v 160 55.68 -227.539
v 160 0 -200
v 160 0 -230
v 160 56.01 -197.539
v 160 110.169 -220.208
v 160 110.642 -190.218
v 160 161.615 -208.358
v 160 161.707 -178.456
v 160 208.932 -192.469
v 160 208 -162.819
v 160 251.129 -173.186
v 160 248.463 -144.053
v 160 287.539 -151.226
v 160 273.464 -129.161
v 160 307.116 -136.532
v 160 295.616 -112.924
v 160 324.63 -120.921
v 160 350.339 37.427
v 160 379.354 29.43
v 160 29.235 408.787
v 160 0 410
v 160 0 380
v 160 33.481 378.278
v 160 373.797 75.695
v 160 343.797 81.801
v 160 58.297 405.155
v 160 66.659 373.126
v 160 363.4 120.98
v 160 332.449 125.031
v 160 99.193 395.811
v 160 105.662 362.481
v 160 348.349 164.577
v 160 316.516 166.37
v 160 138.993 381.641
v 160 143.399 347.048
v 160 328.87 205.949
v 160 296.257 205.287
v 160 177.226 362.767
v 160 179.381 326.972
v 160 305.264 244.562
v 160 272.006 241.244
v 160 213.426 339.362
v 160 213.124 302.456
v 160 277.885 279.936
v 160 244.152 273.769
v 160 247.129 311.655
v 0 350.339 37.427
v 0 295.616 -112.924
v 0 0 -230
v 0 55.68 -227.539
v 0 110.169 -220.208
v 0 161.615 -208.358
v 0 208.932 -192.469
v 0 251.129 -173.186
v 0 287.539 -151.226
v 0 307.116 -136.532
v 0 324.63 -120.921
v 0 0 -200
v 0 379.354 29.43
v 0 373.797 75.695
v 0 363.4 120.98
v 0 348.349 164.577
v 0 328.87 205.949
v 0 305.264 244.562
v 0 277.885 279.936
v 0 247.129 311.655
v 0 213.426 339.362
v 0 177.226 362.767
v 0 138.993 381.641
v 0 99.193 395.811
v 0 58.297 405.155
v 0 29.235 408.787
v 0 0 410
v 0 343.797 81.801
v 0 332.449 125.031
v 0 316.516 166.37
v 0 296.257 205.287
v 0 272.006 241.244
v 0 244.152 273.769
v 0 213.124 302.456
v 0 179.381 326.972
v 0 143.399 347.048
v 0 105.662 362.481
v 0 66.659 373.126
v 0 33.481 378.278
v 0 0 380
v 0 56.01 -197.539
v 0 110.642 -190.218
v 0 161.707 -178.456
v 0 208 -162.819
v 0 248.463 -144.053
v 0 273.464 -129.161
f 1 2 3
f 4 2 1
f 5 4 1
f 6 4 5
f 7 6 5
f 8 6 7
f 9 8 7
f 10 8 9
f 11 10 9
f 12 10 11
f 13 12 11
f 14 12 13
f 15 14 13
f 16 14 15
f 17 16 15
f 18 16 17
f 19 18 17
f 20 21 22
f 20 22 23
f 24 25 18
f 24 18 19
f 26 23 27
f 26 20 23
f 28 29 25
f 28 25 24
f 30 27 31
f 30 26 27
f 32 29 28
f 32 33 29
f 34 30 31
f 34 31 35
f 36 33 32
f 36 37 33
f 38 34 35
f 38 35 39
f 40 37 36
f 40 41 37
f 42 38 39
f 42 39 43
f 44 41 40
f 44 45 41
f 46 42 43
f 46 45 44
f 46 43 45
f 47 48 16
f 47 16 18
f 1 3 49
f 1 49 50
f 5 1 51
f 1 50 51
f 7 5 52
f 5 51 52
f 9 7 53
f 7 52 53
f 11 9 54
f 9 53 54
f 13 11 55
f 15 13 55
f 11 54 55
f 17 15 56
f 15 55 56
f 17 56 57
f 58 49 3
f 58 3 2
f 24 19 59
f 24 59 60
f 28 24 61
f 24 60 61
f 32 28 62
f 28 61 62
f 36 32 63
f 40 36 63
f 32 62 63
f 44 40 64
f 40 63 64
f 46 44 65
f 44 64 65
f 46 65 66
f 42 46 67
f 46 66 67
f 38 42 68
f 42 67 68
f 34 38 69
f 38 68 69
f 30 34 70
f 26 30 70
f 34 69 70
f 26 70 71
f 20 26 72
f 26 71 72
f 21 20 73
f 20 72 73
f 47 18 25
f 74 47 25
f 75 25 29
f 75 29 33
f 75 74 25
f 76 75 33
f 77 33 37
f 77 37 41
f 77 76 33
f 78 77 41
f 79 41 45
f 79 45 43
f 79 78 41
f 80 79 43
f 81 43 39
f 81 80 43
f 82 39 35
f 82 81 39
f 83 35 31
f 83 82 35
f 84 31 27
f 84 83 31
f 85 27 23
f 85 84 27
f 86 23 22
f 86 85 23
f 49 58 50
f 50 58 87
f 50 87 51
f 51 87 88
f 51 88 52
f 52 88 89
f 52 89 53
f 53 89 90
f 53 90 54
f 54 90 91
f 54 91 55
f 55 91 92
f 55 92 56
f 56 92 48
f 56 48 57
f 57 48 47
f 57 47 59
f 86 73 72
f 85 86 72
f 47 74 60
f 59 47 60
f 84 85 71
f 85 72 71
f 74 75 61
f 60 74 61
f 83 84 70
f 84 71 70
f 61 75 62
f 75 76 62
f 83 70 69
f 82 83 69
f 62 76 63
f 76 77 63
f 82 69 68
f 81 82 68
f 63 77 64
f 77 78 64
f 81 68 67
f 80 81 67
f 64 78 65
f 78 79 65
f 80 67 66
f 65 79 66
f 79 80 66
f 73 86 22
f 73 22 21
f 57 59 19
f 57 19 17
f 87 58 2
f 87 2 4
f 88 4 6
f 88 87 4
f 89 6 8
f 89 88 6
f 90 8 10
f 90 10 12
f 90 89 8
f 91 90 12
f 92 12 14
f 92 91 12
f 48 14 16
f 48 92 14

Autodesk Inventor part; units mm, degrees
ref_plane "YZ Plane" through (0, 0, 0) normal (1, 0, 0) x (0, 1, 0)
ref_plane "XY Plane" through (0, 0, 0) normal (0, 0, 1) x (1, 0, 0)
sketch "Sketch2" plane through (0, 0, 0) normal (1, 0, 0) x (0, 1, 0)
  line L0 (0, 380) -> (0, 410)
  line L1 (0, -230) -> (0, -200)
  line L2 (0, 0) -> (0, 132.8644)
  line L3 (295.6158, -112.924) -> (350.339, 37.4268)
  line L4 (379.3536, 29.4296) -> (324.6304, -120.9212)
  ellipse E0 centre (0, 0) end of major axis (358.1699, 0) minor radius 200 (0, -200) -> (295.6158, -112.924) ccw
  ellipse E1 centre (0, 0) end of major axis (352.0508, 0) minor radius 380 (350.339, 37.4268) -> (0, 380) ccw
  ellipse E2 centre (0, 0) end of major axis (381.6296, 0) minor radius 230 (0, -230) -> (324.6304, -120.9212) ccw
  ellipse E3 centre (0, 0) end of major axis (380.3347, 0) minor radius 410 (379.3536, 29.4296) -> (0, 410) ccw
  point P0 (0, 0)
  dimension "d10" = 30
  dimension "d11" = 30
  dimension "d12" = 0
  dimension "d16" = 380
  dimension "d17" = 200
  dimension "d25" = 20
  dimension "d26" = 160
  dimension "d27" = 30
  dimension "d28" = 160
extrude "Extrusion1" add sketch "Sketch2" along normal blind 160
sketch "Sketch3" plane through (0, 0, 0) normal (-1, 0, 0) x (0, 0, 1)
  line L0 (171.5389, -307.9404) -> (-54.4979, 313.0907)
  line L1 (-120.9212, 324.6304) -> (29.4296, 379.3536) projected
  line L2 (-111.428, -307.9404) -> (360.7046, -307.9404)
  line L3 (76.7879, 236.8347) -> (76.7879, -307.9404)
  point P0 (0, 0)
  dimension "d31" = 94.751
sketch "Sketch4" plane through (0, 0, 380) normal (0, -1, 0) x (1, 0, 0)
  line L0 (160, 30) -> (160, 0) projected
  line L1 (160, -610) -> (160, -500.9212) projected
  line L2 (160, 30) -> (160, -610)
  line L3 (160, 0) -> (160, -342.5732) projected
  ellipse E0 centre (160, -290) end of major axis (390, -290) minor radius 320 (160, -610) -> (160, 30) ccw
  line L4 (0, 30) -> (160, 30) projected
  line L5 (0, 0) -> (160, 0) projected
  ellipse E1 centre (160, -290) end of major axis (360, -290) minor radius 290 (160, -580) -> (160, 0) ccw
  point P0 (0, -380)
  dimension "d33" = 200
  dimension "d34" = 230
  dimension "d32" = 320
ref_plane "Work Plane3" through (0, 0, 90) normal (0, 0, -1) x (-1, 0, 0)
ref_plane "Work Plane1" through (0, 0, -230) normal (0, 0, -1) x (-1, 0, 0)
ref_plane "Work Plane2" through (0, 0, 410) normal (0, 0, 1) x (1, 0, 0)
sketch "Sketch6" plane through (0, 0, 90) normal (0, 0, -1) x (-1, 0, 0)
  line L0 (-160, 371.0583) -> (0, 371.0583) projected
  line L1 (0, 371.0583) -> (0, 342.0343) projected
  line L2 (0, 342.0343) -> (-160, 342.0343) projected
  line L3 (-160, 342.0343) -> (-160, 371.0583) projected
  ellipse E0 centre (-160, -10) end of major axis (-390, -10) minor radius 381.0583 (-160, 371.0583) -> (-390, -10) ccw
  line L4 (-160, 0) -> (-160, 350.339) projected
  line L5 (-160, 342.0343) -> (-160, 371.0583)
  line L6 (-360, -10) -> (-390, -10)
  ellipse E1 centre (-160, -10) end of major axis (-360, -10) minor radius 352.0343 (-160, 342.0343) -> (-360, -10) ccw
  ellipse E2 centre (-160, -10) end of major axis (-403.0676, -10) minor radius 410.7244 (-34.7861, 342.0343) -> (-69.2995, 371.0583) ccw
  line L7 (0, 0) -> (-160, 0) projected
  point P0 (-160, 324.6304)
  dimension "d62" = 200
  dimension "d63" = 230
  dimension "d58" = 30
  dimension "d59" = 0
  dimension "d60" = 10
  dimension "d61" = 0
sketch "Sketch7" plane through (0, 0, 90) normal (0, 0, -1) x (-1, 0, 0)
  line L0 (0, 0) -> (-160, 0) projected
  ellipse E0 centre (-160, 0) end of major axis (-160, 365) minor radius 215 (-160, 365) -> (-375, 0) ccw
  line L1 (-160, 0) -> (-160, 350.339) projected
  line L2 (-375, 0) -> (-160, 0)
  line L3 (-160, 0) -> (-160, 365)
  line L4 (-160, 324.6304) -> (-160, 379.3536) projected
  dimension "d40" = 215
  dimension "d41" = 365
ref_plane "Work Plane4" through (210, 0, 0) normal (1, 0, 0) x (0, 0, -1)
sketch "Sketch10" plane through (160, 0, 0) normal (1, 0, 0) x (0, 0, -1)
  line L0 (120.9212, 324.6304) -> (-29.4296, 379.3536) projected
  ellipse E0 centre (0, 0) end of major axis (-410, 0) minor radius 380.3347 (-29.4296, 379.3536) -> (-410, 0) ccw projected
  line L1 (-410, 0) -> (-380, 0) projected
  ellipse E1 centre (0, 0) end of major axis (-380, 0) minor radius 352.0508 (-37.4268, 350.339) -> (-380, 0) ccw projected
  line L2 (-37.4268, 350.339) -> (112.924, 295.6158) projected
  ellipse E2 centre (0, 0) end of major axis (0, -358.1699) minor radius 200 (200, 0) -> (112.924, 295.6158) ccw projected
  line L3 (200, 0) -> (230, 0) projected
  ellipse E3 centre (0, 0) end of major axis (0, 381.6296) minor radius 230 (230, 0) -> (120.9212, 324.6304) ccw projected
  point P0 (0, 0)
ref_plane "Work Plane5" through (0, -10, 0) normal (0, 1, 0) x (-1, 0, 0)
sketch "Sketch11" plane through (0, -10, 0) normal (0, 1, 0) x (-1, 0, 0)
  line L0 (-160, -200) -> (-160, -230) projected
  ellipse E0 centre (-160, 90) end of major axis (-160, -230) minor radius 230 (-160, 410) -> (-160, -230) ccw
  line L1 (-160, -200) -> (-160, -112.924) projected
  ellipse E1 centre (-160, 90) end of major axis (-160, -200) minor radius 200 (-160, 380) -> (-160, -200) ccw
  line L2 (0, -230) -> (-160, -230) projected
  line L3 (-160, -200) -> (-160, -230)
  line L4 (0, 380) -> (-160, 380) projected
  line L5 (-160, 410) -> (-160, 380)
  line L6 (-160, 380) -> (-160, 410)
  point P0 (0, 0)
  dimension "d48" = 230
  dimension "d49" = 200
equation "\"d28\" = d26"
properties part number "eggshell_3dprintcore"
